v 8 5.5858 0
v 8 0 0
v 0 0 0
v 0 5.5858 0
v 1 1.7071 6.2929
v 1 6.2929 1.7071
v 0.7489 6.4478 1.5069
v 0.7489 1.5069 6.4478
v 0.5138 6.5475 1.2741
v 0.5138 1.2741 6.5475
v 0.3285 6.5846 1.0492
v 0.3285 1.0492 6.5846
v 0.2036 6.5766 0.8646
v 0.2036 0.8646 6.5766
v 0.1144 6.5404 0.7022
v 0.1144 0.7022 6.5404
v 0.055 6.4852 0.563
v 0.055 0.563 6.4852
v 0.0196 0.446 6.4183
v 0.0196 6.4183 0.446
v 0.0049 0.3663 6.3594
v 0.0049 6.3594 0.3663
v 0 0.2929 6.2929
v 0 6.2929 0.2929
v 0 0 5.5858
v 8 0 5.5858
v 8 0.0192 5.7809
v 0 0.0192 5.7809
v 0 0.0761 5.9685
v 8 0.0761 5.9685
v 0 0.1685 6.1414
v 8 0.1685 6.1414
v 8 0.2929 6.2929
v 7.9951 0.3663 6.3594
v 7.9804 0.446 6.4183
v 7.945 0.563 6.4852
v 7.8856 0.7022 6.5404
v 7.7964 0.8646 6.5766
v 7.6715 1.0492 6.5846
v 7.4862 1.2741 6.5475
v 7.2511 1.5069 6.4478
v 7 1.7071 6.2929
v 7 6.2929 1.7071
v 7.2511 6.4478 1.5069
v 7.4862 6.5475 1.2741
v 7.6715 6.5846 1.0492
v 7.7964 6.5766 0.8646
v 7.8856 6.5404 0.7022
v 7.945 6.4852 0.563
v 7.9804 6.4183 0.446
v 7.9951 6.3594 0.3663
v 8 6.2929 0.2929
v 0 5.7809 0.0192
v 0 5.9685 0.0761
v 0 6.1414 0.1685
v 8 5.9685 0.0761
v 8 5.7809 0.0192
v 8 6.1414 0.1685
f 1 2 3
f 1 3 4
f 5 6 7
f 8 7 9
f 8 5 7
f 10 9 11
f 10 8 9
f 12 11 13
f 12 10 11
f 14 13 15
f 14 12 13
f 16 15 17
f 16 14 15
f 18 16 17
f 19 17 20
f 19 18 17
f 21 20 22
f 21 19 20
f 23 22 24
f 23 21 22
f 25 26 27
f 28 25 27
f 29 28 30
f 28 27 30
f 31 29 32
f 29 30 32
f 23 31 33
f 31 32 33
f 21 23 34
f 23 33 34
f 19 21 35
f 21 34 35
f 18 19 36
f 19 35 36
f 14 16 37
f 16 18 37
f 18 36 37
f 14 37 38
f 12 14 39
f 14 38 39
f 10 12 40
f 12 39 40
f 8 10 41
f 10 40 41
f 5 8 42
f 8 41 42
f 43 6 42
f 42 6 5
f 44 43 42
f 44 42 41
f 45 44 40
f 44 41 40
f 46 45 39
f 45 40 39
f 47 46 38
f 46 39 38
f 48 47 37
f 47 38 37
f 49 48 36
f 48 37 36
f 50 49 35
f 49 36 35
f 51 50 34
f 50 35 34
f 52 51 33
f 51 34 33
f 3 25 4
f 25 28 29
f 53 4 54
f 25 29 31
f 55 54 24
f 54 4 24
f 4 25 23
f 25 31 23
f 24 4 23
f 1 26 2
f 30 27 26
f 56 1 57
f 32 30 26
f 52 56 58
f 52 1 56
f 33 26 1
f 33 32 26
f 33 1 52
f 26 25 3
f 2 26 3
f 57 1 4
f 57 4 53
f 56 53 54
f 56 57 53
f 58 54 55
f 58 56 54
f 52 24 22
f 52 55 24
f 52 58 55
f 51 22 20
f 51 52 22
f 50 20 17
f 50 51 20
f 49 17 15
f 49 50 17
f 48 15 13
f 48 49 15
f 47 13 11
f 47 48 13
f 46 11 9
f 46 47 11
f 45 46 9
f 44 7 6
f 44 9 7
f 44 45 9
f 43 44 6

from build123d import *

# Parameters (mm, degrees)
F1_DEPTH = 8
F2_R     = 1


with BuildPart() as f1:
    # F0 (on Right) → F1 (new body)
    with BuildSketch(Plane.YZ):
        Polygon((0, 8), (0, 0), (8, 0), align=None)
    extrude(amount=F1_DEPTH)

    # F2
    f2_edges = [f1.edges().sort_by_distance(p)[0] for p in [
        (4, 0, 8),
        (4, 8, 0),
        (0, 4, 4),
        (8, 4, 4),
    ]]
    fillet(f2_edges, radius=F2_R)


solid = f1.part
